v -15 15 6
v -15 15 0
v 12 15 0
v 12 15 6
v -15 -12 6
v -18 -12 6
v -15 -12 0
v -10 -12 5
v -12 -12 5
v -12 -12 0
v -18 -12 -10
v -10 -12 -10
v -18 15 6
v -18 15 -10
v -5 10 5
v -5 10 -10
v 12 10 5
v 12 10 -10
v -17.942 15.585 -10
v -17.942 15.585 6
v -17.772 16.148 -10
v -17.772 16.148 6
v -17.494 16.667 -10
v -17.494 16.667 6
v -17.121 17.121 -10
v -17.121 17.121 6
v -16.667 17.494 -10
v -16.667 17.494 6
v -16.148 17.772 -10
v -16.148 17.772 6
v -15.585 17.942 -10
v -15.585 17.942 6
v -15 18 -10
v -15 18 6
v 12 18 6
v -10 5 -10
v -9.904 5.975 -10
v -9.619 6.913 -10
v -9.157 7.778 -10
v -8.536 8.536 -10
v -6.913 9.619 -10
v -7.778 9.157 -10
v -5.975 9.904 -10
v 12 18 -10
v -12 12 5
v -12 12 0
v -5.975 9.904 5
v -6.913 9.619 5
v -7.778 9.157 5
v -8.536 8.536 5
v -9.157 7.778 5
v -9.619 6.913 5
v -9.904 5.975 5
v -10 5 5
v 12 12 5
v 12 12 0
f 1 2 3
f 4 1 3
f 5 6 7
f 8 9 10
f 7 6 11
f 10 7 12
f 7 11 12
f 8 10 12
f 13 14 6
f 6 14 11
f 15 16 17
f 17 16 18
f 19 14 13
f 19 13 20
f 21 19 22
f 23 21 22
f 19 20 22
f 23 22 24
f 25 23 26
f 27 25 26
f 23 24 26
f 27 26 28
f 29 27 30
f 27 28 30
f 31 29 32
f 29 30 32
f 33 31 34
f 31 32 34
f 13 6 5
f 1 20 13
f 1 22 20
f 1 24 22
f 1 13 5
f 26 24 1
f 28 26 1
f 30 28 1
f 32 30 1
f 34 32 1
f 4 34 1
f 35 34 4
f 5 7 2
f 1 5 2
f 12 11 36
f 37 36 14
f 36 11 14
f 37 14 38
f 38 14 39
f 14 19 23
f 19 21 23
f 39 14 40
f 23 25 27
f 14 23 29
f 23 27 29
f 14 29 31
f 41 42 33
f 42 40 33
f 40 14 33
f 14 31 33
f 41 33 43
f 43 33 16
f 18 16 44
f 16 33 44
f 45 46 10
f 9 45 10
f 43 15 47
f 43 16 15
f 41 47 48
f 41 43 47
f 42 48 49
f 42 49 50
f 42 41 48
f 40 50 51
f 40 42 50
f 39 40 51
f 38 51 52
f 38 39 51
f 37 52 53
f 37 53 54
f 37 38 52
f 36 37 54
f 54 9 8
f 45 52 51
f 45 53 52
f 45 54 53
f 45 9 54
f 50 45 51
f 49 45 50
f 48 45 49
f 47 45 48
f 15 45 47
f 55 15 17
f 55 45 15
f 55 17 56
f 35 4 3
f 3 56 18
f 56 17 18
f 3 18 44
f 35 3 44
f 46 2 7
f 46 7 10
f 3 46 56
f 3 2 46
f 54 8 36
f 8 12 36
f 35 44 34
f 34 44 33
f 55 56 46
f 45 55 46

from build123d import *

# Parameters (mm, degrees)
F1_DEPTH = 10
F2_DEPTH = 6
F3_DEPTH = 5
F4_R     = 5
F5_R     = 3


with BuildPart() as f1:
    # F0 (on Top) → F1 (new body)
    with BuildSketch(Plane.XY):
        Polygon((-12, -12), (-12, 12), (12, 12), (12, 15), (-15, 15), (-15, -12), align=None)
        Polygon((12, 12), (-12, 12), (-12, -12), (-10, -12), (-10, 10), (12, 10), align=None)
        Polygon((-15, 15), (12, 15), (12, 18), (-18, 18), (-18, -12), (-15, -12), align=None)
    extrude(amount=-F1_DEPTH)

    # F0 (on Top) → F2 (join)
    with BuildSketch(Plane.XY):
        Polygon((-15, 15), (12, 15), (12, 18), (-18, 18), (-18, -12), (-15, -12), align=None)
    extrude(amount=F2_DEPTH)

    # F0 (on Top) → F3 (join)
    with BuildSketch(Plane.XY):
        Polygon((12, 12), (-12, 12), (-12, -12), (-10, -12), (-10, 10), (12, 10), align=None)
    extrude(amount=F3_DEPTH)

    # F4
    f4_edges = [f1.edges().sort_by_distance(p)[0] for p in [
        (-10, 10, -2.5),
    ]]
    fillet(f4_edges, radius=F4_R)

    # F5
    f5_edges = [f1.edges().sort_by_distance(p)[0] for p in [
        (-18, 18, -2),
    ]]
    fillet(f5_edges, radius=F5_R)


solid = f1.part
